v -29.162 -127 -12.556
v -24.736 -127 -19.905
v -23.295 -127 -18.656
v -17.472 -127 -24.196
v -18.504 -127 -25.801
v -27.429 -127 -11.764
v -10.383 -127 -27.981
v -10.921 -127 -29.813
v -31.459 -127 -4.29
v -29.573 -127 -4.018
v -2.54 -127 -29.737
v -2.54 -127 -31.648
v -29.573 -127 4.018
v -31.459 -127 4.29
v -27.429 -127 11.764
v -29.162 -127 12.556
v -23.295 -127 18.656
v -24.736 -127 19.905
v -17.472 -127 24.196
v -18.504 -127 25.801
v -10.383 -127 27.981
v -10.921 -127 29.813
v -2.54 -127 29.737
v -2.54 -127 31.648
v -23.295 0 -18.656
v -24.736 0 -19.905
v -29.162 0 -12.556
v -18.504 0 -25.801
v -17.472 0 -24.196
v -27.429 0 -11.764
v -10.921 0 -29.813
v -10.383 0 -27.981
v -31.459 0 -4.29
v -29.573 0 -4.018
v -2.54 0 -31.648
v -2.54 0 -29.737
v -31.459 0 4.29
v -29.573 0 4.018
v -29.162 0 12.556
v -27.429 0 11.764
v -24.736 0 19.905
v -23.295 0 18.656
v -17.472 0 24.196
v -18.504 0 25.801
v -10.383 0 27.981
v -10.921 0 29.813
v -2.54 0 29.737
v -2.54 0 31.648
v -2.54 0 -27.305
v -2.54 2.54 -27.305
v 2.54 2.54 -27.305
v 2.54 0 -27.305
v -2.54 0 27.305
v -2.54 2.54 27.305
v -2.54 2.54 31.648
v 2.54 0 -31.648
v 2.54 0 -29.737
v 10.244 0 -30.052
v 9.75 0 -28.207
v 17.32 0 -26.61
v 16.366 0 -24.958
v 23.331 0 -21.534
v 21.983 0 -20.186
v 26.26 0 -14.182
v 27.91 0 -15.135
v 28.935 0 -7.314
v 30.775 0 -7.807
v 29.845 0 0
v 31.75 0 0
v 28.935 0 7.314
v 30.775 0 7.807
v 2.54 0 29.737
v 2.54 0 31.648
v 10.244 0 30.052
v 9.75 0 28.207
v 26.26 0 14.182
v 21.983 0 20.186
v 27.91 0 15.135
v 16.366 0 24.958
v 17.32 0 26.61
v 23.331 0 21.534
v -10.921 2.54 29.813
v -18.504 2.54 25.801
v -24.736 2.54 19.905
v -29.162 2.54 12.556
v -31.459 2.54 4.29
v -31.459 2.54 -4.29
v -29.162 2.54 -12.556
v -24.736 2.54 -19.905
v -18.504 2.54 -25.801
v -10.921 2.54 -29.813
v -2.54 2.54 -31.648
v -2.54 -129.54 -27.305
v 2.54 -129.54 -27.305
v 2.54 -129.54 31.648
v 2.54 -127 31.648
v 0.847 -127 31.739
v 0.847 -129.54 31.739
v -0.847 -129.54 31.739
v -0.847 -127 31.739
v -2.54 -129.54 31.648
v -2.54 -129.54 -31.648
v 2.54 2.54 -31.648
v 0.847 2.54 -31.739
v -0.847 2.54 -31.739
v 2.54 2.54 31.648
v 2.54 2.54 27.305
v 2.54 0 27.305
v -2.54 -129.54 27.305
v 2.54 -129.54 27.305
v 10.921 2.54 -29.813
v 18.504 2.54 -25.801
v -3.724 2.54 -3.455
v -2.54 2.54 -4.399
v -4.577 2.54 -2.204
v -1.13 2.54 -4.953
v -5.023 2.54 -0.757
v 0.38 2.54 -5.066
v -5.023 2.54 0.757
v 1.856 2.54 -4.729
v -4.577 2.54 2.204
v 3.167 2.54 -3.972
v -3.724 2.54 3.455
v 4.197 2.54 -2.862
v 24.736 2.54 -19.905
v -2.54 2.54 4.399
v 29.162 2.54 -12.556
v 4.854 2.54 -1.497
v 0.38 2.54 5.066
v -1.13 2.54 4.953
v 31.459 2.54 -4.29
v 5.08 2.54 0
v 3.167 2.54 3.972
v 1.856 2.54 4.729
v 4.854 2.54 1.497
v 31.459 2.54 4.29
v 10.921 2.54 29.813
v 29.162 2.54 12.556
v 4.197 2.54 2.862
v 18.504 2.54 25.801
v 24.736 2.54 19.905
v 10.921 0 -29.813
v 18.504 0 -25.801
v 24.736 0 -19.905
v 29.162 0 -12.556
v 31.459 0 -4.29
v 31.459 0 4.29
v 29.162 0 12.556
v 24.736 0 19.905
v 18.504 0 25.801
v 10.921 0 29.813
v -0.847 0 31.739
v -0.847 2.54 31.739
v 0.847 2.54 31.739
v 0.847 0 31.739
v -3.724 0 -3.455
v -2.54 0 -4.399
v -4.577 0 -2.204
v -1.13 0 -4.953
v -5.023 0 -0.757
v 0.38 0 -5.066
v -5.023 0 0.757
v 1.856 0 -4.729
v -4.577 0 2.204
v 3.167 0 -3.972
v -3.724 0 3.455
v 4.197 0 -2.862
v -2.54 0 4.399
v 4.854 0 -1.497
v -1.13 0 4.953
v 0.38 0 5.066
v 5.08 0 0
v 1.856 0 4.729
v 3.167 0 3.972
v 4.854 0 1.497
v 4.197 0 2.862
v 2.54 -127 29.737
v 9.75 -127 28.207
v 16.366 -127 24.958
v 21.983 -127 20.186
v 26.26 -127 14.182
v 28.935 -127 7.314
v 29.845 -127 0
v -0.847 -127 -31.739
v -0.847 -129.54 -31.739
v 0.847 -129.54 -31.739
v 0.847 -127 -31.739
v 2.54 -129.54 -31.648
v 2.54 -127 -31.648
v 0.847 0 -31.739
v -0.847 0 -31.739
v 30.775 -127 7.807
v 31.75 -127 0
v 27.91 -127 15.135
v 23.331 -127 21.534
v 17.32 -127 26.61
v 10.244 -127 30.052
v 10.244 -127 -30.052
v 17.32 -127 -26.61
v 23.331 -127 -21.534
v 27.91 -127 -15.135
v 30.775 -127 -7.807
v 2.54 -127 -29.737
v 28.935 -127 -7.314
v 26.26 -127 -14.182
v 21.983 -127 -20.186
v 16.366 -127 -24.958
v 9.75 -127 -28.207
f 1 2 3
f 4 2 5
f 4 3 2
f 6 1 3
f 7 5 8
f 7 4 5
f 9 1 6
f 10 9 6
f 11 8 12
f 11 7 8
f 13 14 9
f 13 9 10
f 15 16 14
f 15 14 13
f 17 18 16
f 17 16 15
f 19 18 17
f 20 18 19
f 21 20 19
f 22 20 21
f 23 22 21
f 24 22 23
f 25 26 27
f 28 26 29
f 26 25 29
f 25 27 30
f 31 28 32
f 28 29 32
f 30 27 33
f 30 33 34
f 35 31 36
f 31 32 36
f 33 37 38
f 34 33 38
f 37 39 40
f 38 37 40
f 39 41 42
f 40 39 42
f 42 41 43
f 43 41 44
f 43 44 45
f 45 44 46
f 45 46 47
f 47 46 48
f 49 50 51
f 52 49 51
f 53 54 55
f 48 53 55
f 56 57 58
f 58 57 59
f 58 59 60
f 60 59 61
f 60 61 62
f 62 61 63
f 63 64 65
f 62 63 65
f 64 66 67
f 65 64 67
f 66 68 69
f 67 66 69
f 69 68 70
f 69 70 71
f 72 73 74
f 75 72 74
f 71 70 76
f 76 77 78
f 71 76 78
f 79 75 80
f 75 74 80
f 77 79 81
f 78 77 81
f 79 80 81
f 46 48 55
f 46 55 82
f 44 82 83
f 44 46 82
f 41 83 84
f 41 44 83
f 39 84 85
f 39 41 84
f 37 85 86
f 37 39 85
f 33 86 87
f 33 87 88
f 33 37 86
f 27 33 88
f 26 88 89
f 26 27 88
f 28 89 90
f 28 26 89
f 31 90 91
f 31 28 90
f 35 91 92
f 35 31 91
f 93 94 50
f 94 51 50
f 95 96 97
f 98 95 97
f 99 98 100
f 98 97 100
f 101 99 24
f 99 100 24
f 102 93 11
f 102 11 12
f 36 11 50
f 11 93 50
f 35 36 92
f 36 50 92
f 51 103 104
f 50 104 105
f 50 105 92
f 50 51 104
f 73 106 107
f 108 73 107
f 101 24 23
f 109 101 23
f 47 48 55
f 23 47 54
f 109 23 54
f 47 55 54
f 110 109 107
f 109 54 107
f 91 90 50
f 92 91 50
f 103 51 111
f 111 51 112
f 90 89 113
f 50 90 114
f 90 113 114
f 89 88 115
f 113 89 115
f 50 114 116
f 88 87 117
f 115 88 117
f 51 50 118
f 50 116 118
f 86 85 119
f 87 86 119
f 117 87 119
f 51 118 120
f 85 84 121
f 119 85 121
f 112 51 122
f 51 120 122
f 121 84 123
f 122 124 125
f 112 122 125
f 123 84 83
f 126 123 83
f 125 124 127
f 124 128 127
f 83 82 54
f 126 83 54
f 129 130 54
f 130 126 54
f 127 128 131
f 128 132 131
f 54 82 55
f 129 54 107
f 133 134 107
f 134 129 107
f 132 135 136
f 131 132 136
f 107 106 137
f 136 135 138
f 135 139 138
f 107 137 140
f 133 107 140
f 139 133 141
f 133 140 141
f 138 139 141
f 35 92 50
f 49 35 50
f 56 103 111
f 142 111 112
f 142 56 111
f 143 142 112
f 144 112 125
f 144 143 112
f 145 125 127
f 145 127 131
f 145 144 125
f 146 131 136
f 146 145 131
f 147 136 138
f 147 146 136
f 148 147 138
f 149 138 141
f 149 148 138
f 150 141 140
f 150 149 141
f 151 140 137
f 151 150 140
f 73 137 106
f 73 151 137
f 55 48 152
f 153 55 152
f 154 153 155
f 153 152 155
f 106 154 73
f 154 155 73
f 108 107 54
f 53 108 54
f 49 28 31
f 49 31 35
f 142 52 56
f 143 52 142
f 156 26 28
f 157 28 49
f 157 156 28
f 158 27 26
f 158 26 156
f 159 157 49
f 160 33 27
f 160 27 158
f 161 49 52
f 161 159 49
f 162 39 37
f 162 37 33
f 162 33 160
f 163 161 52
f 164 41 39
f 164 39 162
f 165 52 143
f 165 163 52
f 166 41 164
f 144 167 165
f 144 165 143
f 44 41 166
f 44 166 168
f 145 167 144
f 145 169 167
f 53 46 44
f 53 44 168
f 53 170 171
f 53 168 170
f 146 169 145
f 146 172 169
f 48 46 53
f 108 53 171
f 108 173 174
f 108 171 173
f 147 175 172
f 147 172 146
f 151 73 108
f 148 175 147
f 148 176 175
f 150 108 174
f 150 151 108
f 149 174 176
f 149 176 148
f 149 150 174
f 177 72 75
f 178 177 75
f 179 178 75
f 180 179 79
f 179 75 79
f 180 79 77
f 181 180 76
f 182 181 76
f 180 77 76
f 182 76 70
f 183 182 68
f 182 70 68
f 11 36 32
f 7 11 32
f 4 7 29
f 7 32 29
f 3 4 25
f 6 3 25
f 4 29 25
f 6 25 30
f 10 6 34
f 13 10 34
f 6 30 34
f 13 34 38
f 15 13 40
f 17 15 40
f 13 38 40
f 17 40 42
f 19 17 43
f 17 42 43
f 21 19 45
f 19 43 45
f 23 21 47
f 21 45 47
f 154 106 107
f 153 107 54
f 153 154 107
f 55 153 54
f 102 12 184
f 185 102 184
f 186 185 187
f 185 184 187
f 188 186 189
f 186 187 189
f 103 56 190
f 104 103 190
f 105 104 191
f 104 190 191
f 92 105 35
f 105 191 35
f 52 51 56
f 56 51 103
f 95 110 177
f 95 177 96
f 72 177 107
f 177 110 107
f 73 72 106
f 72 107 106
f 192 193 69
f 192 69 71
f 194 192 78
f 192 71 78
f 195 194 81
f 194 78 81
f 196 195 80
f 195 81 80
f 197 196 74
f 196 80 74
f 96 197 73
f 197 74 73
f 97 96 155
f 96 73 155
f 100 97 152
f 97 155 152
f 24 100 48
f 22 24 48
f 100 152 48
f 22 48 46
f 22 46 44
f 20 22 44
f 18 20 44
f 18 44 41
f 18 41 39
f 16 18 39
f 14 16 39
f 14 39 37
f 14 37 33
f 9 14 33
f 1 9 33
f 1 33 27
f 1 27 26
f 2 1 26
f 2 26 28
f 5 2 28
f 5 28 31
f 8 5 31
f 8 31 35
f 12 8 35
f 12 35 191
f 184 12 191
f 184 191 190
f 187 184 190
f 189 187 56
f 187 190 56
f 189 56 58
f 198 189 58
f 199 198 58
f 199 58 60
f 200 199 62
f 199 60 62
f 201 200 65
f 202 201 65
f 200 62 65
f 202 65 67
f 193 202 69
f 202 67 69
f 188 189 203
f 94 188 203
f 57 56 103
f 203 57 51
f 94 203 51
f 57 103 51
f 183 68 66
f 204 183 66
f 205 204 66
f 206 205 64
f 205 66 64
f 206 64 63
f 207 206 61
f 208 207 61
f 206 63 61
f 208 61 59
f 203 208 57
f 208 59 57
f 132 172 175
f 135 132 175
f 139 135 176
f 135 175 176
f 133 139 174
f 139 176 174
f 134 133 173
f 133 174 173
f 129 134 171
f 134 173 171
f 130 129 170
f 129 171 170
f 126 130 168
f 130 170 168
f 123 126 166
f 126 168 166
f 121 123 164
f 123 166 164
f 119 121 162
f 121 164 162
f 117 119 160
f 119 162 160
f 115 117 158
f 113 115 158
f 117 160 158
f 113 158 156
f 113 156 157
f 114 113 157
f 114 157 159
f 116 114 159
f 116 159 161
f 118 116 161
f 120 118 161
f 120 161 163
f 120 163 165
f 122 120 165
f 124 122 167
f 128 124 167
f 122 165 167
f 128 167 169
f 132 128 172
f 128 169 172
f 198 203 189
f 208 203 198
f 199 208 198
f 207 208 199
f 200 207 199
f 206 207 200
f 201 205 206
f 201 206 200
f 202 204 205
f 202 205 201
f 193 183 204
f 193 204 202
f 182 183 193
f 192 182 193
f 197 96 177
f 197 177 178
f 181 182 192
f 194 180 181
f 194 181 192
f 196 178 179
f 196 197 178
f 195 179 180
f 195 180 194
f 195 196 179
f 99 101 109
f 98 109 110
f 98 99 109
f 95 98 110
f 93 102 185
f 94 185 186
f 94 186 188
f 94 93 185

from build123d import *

# Parameters (mm, degrees)
F0_R     = 31.75
F1_DEPTH = 127
F2_R     = 31.75
F2_R_2   = 5.08
F3_DEPTH = 2.54
F5_DEPTH = 2.54
F7_DEPTH = 2.54
F9_DEPTH = 2.54


with BuildPart() as f1:
    # F0 (on Front) → F1 (new body)
    with BuildSketch(Plane.XZ):
        Circle(F0_R)
        with BuildLine():
            ThreePointArc((2.54, 29.7367184639), (21.9832928039, 20.1856102831), (29.845, 0))
            ThreePointArc((29.845, 0), (21.9832928039, -20.1856102831), (2.54, -29.7367184639))
            ThreePointArc((2.54, -29.7367184639), (1.2711535009, -29.817917328), (0, -29.845))
            ThreePointArc((0, -29.845), (-1.2711535009, -29.817917328), (-2.54, -29.7367184639))
            ThreePointArc((-2.54, -29.7367184639), (-29.845, 0), (-2.54, 29.7367184639))
            ThreePointArc((-2.54, 29.7367184639), (-1.2711535009, 29.817917328), (0, 29.845))
            ThreePointArc((0, 29.845), (1.2711535009, 29.817917328), (2.54, 29.7367184639))
        make_face(mode=Mode.SUBTRACT)
        with BuildLine():
            Line((0, 27.305), (0, 29.845))
            ThreePointArc((0, 29.845), (-1.2711535009, 29.817917328), (-2.54, 29.7367184639))
            Line((-2.54, 29.7367184639), (-2.54, 27.305))
            Line((-2.54, 27.305), (0, 27.305))
        make_face()
        with BuildLine():
            Line((2.54, 27.305), (2.54, 29.7367184639))
            ThreePointArc((2.54, 29.7367184639), (1.2711535009, 29.817917328), (0, 29.845))
            Line((0, 29.845), (0, 27.305))
            Line((0, 27.305), (2.54, 27.305))
        make_face()
        with BuildLine():
            ThreePointArc((-2.54, -29.7367184639), (-1.2711535009, -29.817917328), (0, -29.845))
            Line((0, -29.845), (0, -27.305))
            Line((0, -27.305), (-2.54, -27.305))
            Line((-2.54, -27.305), (-2.54, -29.7367184639))
        make_face()
        with BuildLine():
            ThreePointArc((0, -29.845), (1.2711535009, -29.817917328), (2.54, -29.7367184639))
            Line((2.54, -29.7367184639), (2.54, -27.305))
            Line((2.54, -27.305), (0, -27.305))
            Line((0, -27.305), (0, -29.845))
        make_face()
    extrude(amount=F1_DEPTH)

    # F6 (on face) → F7 (join)
    with BuildSketch(Plane(origin=(0, 0, 0), x_dir=(-1, 0, 0), z_dir=(0, 1, 0))):
        with BuildLine():
            Line((-2.54, 29.7367184639), (-2.54, 27.305))
            Line((-2.54, 27.305), (2.54, 27.305))
            Line((2.54, 27.305), (2.54, 29.7367184639))
            Line((2.54, 29.7367184639), (2.54, 31.6482369177))
            ThreePointArc((2.54, 31.6482369177), (0, 31.75), (-2.54, 31.6482369177))
            Line((-2.54, 31.6482369177), (-2.54, 29.7367184639))
        make_face()
        with BuildLine():
            Line((-2.54, -27.305), (-2.54, -29.7367184639))
            Line((-2.54, -29.7367184639), (-2.54, -31.6482369177))
            ThreePointArc((-2.54, -31.6482369177), (0, -31.75), (2.54, -31.6482369177))
            Line((2.54, -31.6482369177), (2.54, -29.7367184639))
            Line((2.54, -29.7367184639), (2.54, -27.305))
            Line((2.54, -27.305), (-2.54, -27.305))
        make_face()
    extrude(amount=F7_DEPTH)

    # F8 (on face) → F9 (join)
    with BuildSketch(Plane.XZ.offset(127)):
        with BuildLine():
            Line((2.54, 29.7367184639), (2.54, 31.6482369177))
            ThreePointArc((2.54, 31.6482369177), (0, 31.75), (-2.54, 31.6482369177))
            Line((-2.54, 31.6482369177), (-2.54, 29.7367184639))
            Line((-2.54, 29.7367184639), (-2.54, 27.305))
            Line((-2.54, 27.305), (2.54, 27.305))
            Line((2.54, 27.305), (2.54, 29.7367184639))
        make_face()
        with BuildLine():
            ThreePointArc((-2.54, -31.6482369177), (0, -31.75), (2.54, -31.6482369177))
            Line((2.54, -31.6482369177), (2.54, -29.7367184639))
            Line((2.54, -29.7367184639), (2.54, -27.305))
            Line((2.54, -27.305), (-2.54, -27.305))
            Line((-2.54, -27.305), (-2.54, -29.7367184639))
            Line((-2.54, -29.7367184639), (-2.54, -31.6482369177))
        make_face()
    extrude(amount=F9_DEPTH)


with BuildPart() as f3:
    # F2 (on Front) → F3 (new body)
    with BuildSketch(Plane.XZ):
        Circle(F2_R)
        Circle(F2_R_2, mode=Mode.SUBTRACT)
    extrude(amount=-F3_DEPTH)

    # F4 (on face) → F5 (cut)
    with BuildSketch(Plane(origin=(0, 2.54, 0), x_dir=(-1, 0, 0), z_dir=(0, 1, 0))):
        with BuildLine():
            ThreePointArc((-2.54, -31.6482369177), (0, -31.75), (2.54, -31.6482369177))
            Line((2.54, -31.6482369177), (2.54, -27.305))
            Line((2.54, -27.305), (0, -27.305))
            Line((0, -27.305), (-2.54, -27.305))
            Line((-2.54, -27.305), (-2.54, -31.6482369177))
        make_face()
        with BuildLine():
            Line((0, 27.305), (0, 31.75))
            ThreePointArc((0, 31.75), (-1.2710188556, 31.7245490286), (-2.54, 31.6482369177))
            Line((-2.54, 31.6482369177), (-2.54, 27.305))
            Line((-2.54, 27.305), (0, 27.305))
        make_face()
        with BuildLine():
            Line((2.54, 27.305), (2.54, 31.6482369177))
            ThreePointArc((2.54, 31.6482369177), (1.2710188556, 31.7245490286), (0, 31.75))
            Line((0, 31.75), (0, 27.305))
            Line((0, 27.305), (2.54, 27.305))
        make_face()
    extrude(amount=-F5_DEPTH, mode=Mode.SUBTRACT)


solid = Compound([f1.part, f3.part])
